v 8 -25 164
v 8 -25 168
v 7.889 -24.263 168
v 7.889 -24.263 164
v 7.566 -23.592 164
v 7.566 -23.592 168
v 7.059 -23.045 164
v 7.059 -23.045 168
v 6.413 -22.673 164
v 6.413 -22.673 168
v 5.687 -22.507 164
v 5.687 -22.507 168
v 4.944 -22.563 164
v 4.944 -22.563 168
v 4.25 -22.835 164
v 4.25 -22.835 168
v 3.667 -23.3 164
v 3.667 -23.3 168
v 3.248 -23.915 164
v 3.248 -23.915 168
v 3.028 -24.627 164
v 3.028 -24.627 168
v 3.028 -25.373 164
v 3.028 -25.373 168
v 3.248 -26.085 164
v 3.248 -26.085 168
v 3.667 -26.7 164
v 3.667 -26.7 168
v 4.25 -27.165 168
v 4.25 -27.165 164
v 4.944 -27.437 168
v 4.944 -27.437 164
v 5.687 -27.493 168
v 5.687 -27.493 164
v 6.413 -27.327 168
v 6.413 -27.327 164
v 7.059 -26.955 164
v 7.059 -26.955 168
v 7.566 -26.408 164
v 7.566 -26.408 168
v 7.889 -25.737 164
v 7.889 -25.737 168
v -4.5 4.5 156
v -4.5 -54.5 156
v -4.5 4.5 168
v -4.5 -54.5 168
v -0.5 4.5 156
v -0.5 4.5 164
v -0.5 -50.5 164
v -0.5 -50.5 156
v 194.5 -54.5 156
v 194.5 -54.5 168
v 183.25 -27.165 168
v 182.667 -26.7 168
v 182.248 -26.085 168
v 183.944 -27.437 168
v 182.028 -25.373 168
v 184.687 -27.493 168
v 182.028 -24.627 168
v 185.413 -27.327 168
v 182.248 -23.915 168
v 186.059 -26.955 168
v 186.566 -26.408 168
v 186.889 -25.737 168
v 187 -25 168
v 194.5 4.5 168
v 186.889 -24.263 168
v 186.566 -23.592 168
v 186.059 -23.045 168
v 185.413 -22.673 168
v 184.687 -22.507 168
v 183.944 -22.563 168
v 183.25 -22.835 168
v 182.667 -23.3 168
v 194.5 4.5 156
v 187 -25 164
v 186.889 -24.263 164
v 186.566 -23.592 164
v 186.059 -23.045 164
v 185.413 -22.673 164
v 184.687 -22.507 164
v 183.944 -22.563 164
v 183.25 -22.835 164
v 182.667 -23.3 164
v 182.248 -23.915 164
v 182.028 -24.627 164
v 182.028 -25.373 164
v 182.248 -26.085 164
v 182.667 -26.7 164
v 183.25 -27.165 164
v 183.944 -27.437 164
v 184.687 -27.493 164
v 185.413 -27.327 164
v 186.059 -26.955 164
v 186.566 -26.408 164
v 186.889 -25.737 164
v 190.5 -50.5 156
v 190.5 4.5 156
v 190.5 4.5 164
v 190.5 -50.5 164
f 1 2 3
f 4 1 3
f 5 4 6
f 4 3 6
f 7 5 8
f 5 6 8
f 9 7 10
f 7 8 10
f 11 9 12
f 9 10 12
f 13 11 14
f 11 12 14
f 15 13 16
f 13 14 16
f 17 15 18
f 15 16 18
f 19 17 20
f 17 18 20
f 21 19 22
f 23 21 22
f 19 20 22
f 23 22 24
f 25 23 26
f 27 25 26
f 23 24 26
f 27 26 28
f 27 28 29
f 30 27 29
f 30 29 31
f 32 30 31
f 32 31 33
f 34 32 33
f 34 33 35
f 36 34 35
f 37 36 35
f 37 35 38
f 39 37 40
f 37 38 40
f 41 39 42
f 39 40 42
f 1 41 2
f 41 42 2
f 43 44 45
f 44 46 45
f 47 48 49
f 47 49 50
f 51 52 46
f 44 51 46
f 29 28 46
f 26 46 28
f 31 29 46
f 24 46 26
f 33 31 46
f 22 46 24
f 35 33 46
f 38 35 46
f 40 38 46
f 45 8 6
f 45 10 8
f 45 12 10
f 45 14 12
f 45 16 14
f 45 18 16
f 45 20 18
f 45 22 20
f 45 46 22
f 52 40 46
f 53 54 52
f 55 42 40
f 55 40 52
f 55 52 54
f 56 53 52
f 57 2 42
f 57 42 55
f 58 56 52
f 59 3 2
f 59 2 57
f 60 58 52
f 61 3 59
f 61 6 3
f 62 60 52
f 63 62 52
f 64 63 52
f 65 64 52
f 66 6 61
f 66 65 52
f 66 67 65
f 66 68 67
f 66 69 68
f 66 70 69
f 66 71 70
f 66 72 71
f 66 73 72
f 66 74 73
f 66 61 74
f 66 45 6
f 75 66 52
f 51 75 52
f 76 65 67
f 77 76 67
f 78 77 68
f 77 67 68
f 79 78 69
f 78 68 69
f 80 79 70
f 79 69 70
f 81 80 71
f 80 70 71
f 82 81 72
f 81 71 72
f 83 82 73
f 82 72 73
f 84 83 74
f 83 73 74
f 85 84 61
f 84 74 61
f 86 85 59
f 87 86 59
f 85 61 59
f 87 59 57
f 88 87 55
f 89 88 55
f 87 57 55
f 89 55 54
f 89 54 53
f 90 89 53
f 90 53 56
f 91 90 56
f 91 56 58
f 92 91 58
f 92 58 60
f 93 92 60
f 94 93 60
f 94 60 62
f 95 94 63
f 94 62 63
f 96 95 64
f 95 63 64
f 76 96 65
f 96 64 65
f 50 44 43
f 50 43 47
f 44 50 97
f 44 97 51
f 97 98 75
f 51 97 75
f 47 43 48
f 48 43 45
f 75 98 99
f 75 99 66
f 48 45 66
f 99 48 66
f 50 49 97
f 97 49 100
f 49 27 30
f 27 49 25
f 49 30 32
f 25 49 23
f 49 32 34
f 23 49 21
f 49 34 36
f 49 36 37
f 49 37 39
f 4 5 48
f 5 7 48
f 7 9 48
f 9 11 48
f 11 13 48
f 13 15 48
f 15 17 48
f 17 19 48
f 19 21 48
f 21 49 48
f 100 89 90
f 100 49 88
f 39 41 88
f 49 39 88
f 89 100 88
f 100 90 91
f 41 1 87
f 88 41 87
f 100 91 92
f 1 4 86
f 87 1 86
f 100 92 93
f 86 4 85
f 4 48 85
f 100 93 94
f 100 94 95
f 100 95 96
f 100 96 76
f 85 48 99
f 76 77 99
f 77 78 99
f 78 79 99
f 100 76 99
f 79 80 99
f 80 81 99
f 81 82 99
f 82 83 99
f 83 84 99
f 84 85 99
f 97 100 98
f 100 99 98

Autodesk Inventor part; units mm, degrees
ref_plane "YZ Plane" through (0, 0, 0) normal (1, 0, 0) x (0, 1, 0)
ref_plane "XZ Plane" through (0, 0, 0) normal (0, 1, 0) x (-1, 0, 0)
ref_plane "Pracovní rovina11" through (0, 0, 164) normal (0, 0, 1) x (1, 0, 0)
sketch "Náčrt11" plane through (0, 0, 164) normal (0, 0, 1) x (1, 0, 0)
  line L0 (-0.5, -50.5) -> (190.5, -50.5)
  line L1 (190.5, -50.5) -> (190.5, 0.5)
  line L2 (190.5, 0.5) -> (-0.5, 0.5)
  line L3 (-0.5, 0.5) -> (-0.5, -50.5)
  line L4 (0, 0) -> (0, -50) projected
  line L5 (190, -50) -> (190, 0) projected
  line L6 (190, 0) -> (0, 0) projected
  line L7 (182, -50) -> (58, -50) projected
  line L8 (-4.5, 4.5) -> (194.5, 4.5)
  line L9 (194.5, 4.5) -> (194.5, -54.5)
  line L10 (194.5, -54.5) -> (-4.5, -54.5)
  line L11 (-4.5, -54.5) -> (-4.5, 4.5)
  dimension "d43" = 0.5
  dimension "d44" = 0.5
  dimension "d45" = 0.5
  dimension "d46" = 0.5
  dimension "d47" = 4
extrude "Vysunutí11" add sketch "Náčrt11" against normal blind 8
sketch "Náčrt12" plane through (0, 0, 164) normal (0, 0, 1) x (1, 0, 0)
  line L0 (-4.5, 4.5) -> (-4.5, -54.5) projected
  line L1 (194.5, 4.5) -> (-4.5, 4.5) projected
  line L2 (194.5, -54.5) -> (194.5, 4.5) projected
  line L3 (-4.5, -54.5) -> (194.5, -54.5) projected
  point P0 (0, 0)
extrude "Vysunutí12" add sketch "Náčrt12" along normal blind 4
sketch "Náčrt13" plane through (0, 0, 168) normal (0, 0, 1) x (1, 0, 0)
  circle A0 centre (5.5, -25) radius 2.5
  circle A1 centre (184.5, -25) radius 2.5
  line L0 (-4.5, -54.5) -> (194.5, -54.5) projected
  line L1 (194.5, 4.5) -> (-4.5, 4.5) projected
  line L2 (-4.5, 4.5) -> (-4.5, -54.5) projected
  line L3 (194.5, -54.5) -> (194.5, 4.5) projected
  point P0 (0, 0)
  dimension "d52" = 5
  dimension "d53" = 5
  dimension "d54" = 59
  dimension "d55" = 29.5
  dimension "d56" = 29.5
  dimension "d57" = 10
  dimension "d58" = 10
extrude "Vysunutí13" cut sketch "Náčrt13" against normal through all contours A0 | A1
sketch "Náčrt14" plane through (-4.5, 4.5, 156) normal (0, 1, 0) x (1, 0, 0)
  line L0 (4, -8) -> (4, 0) projected
  line L1 (195, -8) -> (195, 0) projected
  line L2 (4, -8) -> (195, -8) projected
  line L3 (0, 0) -> (199, 0) projected
  point P0 (4.5, 156)
extrude "Vysunutí14" cut sketch "Náčrt14" against normal up to surface (4 mm away)
properties part number "krab1"
